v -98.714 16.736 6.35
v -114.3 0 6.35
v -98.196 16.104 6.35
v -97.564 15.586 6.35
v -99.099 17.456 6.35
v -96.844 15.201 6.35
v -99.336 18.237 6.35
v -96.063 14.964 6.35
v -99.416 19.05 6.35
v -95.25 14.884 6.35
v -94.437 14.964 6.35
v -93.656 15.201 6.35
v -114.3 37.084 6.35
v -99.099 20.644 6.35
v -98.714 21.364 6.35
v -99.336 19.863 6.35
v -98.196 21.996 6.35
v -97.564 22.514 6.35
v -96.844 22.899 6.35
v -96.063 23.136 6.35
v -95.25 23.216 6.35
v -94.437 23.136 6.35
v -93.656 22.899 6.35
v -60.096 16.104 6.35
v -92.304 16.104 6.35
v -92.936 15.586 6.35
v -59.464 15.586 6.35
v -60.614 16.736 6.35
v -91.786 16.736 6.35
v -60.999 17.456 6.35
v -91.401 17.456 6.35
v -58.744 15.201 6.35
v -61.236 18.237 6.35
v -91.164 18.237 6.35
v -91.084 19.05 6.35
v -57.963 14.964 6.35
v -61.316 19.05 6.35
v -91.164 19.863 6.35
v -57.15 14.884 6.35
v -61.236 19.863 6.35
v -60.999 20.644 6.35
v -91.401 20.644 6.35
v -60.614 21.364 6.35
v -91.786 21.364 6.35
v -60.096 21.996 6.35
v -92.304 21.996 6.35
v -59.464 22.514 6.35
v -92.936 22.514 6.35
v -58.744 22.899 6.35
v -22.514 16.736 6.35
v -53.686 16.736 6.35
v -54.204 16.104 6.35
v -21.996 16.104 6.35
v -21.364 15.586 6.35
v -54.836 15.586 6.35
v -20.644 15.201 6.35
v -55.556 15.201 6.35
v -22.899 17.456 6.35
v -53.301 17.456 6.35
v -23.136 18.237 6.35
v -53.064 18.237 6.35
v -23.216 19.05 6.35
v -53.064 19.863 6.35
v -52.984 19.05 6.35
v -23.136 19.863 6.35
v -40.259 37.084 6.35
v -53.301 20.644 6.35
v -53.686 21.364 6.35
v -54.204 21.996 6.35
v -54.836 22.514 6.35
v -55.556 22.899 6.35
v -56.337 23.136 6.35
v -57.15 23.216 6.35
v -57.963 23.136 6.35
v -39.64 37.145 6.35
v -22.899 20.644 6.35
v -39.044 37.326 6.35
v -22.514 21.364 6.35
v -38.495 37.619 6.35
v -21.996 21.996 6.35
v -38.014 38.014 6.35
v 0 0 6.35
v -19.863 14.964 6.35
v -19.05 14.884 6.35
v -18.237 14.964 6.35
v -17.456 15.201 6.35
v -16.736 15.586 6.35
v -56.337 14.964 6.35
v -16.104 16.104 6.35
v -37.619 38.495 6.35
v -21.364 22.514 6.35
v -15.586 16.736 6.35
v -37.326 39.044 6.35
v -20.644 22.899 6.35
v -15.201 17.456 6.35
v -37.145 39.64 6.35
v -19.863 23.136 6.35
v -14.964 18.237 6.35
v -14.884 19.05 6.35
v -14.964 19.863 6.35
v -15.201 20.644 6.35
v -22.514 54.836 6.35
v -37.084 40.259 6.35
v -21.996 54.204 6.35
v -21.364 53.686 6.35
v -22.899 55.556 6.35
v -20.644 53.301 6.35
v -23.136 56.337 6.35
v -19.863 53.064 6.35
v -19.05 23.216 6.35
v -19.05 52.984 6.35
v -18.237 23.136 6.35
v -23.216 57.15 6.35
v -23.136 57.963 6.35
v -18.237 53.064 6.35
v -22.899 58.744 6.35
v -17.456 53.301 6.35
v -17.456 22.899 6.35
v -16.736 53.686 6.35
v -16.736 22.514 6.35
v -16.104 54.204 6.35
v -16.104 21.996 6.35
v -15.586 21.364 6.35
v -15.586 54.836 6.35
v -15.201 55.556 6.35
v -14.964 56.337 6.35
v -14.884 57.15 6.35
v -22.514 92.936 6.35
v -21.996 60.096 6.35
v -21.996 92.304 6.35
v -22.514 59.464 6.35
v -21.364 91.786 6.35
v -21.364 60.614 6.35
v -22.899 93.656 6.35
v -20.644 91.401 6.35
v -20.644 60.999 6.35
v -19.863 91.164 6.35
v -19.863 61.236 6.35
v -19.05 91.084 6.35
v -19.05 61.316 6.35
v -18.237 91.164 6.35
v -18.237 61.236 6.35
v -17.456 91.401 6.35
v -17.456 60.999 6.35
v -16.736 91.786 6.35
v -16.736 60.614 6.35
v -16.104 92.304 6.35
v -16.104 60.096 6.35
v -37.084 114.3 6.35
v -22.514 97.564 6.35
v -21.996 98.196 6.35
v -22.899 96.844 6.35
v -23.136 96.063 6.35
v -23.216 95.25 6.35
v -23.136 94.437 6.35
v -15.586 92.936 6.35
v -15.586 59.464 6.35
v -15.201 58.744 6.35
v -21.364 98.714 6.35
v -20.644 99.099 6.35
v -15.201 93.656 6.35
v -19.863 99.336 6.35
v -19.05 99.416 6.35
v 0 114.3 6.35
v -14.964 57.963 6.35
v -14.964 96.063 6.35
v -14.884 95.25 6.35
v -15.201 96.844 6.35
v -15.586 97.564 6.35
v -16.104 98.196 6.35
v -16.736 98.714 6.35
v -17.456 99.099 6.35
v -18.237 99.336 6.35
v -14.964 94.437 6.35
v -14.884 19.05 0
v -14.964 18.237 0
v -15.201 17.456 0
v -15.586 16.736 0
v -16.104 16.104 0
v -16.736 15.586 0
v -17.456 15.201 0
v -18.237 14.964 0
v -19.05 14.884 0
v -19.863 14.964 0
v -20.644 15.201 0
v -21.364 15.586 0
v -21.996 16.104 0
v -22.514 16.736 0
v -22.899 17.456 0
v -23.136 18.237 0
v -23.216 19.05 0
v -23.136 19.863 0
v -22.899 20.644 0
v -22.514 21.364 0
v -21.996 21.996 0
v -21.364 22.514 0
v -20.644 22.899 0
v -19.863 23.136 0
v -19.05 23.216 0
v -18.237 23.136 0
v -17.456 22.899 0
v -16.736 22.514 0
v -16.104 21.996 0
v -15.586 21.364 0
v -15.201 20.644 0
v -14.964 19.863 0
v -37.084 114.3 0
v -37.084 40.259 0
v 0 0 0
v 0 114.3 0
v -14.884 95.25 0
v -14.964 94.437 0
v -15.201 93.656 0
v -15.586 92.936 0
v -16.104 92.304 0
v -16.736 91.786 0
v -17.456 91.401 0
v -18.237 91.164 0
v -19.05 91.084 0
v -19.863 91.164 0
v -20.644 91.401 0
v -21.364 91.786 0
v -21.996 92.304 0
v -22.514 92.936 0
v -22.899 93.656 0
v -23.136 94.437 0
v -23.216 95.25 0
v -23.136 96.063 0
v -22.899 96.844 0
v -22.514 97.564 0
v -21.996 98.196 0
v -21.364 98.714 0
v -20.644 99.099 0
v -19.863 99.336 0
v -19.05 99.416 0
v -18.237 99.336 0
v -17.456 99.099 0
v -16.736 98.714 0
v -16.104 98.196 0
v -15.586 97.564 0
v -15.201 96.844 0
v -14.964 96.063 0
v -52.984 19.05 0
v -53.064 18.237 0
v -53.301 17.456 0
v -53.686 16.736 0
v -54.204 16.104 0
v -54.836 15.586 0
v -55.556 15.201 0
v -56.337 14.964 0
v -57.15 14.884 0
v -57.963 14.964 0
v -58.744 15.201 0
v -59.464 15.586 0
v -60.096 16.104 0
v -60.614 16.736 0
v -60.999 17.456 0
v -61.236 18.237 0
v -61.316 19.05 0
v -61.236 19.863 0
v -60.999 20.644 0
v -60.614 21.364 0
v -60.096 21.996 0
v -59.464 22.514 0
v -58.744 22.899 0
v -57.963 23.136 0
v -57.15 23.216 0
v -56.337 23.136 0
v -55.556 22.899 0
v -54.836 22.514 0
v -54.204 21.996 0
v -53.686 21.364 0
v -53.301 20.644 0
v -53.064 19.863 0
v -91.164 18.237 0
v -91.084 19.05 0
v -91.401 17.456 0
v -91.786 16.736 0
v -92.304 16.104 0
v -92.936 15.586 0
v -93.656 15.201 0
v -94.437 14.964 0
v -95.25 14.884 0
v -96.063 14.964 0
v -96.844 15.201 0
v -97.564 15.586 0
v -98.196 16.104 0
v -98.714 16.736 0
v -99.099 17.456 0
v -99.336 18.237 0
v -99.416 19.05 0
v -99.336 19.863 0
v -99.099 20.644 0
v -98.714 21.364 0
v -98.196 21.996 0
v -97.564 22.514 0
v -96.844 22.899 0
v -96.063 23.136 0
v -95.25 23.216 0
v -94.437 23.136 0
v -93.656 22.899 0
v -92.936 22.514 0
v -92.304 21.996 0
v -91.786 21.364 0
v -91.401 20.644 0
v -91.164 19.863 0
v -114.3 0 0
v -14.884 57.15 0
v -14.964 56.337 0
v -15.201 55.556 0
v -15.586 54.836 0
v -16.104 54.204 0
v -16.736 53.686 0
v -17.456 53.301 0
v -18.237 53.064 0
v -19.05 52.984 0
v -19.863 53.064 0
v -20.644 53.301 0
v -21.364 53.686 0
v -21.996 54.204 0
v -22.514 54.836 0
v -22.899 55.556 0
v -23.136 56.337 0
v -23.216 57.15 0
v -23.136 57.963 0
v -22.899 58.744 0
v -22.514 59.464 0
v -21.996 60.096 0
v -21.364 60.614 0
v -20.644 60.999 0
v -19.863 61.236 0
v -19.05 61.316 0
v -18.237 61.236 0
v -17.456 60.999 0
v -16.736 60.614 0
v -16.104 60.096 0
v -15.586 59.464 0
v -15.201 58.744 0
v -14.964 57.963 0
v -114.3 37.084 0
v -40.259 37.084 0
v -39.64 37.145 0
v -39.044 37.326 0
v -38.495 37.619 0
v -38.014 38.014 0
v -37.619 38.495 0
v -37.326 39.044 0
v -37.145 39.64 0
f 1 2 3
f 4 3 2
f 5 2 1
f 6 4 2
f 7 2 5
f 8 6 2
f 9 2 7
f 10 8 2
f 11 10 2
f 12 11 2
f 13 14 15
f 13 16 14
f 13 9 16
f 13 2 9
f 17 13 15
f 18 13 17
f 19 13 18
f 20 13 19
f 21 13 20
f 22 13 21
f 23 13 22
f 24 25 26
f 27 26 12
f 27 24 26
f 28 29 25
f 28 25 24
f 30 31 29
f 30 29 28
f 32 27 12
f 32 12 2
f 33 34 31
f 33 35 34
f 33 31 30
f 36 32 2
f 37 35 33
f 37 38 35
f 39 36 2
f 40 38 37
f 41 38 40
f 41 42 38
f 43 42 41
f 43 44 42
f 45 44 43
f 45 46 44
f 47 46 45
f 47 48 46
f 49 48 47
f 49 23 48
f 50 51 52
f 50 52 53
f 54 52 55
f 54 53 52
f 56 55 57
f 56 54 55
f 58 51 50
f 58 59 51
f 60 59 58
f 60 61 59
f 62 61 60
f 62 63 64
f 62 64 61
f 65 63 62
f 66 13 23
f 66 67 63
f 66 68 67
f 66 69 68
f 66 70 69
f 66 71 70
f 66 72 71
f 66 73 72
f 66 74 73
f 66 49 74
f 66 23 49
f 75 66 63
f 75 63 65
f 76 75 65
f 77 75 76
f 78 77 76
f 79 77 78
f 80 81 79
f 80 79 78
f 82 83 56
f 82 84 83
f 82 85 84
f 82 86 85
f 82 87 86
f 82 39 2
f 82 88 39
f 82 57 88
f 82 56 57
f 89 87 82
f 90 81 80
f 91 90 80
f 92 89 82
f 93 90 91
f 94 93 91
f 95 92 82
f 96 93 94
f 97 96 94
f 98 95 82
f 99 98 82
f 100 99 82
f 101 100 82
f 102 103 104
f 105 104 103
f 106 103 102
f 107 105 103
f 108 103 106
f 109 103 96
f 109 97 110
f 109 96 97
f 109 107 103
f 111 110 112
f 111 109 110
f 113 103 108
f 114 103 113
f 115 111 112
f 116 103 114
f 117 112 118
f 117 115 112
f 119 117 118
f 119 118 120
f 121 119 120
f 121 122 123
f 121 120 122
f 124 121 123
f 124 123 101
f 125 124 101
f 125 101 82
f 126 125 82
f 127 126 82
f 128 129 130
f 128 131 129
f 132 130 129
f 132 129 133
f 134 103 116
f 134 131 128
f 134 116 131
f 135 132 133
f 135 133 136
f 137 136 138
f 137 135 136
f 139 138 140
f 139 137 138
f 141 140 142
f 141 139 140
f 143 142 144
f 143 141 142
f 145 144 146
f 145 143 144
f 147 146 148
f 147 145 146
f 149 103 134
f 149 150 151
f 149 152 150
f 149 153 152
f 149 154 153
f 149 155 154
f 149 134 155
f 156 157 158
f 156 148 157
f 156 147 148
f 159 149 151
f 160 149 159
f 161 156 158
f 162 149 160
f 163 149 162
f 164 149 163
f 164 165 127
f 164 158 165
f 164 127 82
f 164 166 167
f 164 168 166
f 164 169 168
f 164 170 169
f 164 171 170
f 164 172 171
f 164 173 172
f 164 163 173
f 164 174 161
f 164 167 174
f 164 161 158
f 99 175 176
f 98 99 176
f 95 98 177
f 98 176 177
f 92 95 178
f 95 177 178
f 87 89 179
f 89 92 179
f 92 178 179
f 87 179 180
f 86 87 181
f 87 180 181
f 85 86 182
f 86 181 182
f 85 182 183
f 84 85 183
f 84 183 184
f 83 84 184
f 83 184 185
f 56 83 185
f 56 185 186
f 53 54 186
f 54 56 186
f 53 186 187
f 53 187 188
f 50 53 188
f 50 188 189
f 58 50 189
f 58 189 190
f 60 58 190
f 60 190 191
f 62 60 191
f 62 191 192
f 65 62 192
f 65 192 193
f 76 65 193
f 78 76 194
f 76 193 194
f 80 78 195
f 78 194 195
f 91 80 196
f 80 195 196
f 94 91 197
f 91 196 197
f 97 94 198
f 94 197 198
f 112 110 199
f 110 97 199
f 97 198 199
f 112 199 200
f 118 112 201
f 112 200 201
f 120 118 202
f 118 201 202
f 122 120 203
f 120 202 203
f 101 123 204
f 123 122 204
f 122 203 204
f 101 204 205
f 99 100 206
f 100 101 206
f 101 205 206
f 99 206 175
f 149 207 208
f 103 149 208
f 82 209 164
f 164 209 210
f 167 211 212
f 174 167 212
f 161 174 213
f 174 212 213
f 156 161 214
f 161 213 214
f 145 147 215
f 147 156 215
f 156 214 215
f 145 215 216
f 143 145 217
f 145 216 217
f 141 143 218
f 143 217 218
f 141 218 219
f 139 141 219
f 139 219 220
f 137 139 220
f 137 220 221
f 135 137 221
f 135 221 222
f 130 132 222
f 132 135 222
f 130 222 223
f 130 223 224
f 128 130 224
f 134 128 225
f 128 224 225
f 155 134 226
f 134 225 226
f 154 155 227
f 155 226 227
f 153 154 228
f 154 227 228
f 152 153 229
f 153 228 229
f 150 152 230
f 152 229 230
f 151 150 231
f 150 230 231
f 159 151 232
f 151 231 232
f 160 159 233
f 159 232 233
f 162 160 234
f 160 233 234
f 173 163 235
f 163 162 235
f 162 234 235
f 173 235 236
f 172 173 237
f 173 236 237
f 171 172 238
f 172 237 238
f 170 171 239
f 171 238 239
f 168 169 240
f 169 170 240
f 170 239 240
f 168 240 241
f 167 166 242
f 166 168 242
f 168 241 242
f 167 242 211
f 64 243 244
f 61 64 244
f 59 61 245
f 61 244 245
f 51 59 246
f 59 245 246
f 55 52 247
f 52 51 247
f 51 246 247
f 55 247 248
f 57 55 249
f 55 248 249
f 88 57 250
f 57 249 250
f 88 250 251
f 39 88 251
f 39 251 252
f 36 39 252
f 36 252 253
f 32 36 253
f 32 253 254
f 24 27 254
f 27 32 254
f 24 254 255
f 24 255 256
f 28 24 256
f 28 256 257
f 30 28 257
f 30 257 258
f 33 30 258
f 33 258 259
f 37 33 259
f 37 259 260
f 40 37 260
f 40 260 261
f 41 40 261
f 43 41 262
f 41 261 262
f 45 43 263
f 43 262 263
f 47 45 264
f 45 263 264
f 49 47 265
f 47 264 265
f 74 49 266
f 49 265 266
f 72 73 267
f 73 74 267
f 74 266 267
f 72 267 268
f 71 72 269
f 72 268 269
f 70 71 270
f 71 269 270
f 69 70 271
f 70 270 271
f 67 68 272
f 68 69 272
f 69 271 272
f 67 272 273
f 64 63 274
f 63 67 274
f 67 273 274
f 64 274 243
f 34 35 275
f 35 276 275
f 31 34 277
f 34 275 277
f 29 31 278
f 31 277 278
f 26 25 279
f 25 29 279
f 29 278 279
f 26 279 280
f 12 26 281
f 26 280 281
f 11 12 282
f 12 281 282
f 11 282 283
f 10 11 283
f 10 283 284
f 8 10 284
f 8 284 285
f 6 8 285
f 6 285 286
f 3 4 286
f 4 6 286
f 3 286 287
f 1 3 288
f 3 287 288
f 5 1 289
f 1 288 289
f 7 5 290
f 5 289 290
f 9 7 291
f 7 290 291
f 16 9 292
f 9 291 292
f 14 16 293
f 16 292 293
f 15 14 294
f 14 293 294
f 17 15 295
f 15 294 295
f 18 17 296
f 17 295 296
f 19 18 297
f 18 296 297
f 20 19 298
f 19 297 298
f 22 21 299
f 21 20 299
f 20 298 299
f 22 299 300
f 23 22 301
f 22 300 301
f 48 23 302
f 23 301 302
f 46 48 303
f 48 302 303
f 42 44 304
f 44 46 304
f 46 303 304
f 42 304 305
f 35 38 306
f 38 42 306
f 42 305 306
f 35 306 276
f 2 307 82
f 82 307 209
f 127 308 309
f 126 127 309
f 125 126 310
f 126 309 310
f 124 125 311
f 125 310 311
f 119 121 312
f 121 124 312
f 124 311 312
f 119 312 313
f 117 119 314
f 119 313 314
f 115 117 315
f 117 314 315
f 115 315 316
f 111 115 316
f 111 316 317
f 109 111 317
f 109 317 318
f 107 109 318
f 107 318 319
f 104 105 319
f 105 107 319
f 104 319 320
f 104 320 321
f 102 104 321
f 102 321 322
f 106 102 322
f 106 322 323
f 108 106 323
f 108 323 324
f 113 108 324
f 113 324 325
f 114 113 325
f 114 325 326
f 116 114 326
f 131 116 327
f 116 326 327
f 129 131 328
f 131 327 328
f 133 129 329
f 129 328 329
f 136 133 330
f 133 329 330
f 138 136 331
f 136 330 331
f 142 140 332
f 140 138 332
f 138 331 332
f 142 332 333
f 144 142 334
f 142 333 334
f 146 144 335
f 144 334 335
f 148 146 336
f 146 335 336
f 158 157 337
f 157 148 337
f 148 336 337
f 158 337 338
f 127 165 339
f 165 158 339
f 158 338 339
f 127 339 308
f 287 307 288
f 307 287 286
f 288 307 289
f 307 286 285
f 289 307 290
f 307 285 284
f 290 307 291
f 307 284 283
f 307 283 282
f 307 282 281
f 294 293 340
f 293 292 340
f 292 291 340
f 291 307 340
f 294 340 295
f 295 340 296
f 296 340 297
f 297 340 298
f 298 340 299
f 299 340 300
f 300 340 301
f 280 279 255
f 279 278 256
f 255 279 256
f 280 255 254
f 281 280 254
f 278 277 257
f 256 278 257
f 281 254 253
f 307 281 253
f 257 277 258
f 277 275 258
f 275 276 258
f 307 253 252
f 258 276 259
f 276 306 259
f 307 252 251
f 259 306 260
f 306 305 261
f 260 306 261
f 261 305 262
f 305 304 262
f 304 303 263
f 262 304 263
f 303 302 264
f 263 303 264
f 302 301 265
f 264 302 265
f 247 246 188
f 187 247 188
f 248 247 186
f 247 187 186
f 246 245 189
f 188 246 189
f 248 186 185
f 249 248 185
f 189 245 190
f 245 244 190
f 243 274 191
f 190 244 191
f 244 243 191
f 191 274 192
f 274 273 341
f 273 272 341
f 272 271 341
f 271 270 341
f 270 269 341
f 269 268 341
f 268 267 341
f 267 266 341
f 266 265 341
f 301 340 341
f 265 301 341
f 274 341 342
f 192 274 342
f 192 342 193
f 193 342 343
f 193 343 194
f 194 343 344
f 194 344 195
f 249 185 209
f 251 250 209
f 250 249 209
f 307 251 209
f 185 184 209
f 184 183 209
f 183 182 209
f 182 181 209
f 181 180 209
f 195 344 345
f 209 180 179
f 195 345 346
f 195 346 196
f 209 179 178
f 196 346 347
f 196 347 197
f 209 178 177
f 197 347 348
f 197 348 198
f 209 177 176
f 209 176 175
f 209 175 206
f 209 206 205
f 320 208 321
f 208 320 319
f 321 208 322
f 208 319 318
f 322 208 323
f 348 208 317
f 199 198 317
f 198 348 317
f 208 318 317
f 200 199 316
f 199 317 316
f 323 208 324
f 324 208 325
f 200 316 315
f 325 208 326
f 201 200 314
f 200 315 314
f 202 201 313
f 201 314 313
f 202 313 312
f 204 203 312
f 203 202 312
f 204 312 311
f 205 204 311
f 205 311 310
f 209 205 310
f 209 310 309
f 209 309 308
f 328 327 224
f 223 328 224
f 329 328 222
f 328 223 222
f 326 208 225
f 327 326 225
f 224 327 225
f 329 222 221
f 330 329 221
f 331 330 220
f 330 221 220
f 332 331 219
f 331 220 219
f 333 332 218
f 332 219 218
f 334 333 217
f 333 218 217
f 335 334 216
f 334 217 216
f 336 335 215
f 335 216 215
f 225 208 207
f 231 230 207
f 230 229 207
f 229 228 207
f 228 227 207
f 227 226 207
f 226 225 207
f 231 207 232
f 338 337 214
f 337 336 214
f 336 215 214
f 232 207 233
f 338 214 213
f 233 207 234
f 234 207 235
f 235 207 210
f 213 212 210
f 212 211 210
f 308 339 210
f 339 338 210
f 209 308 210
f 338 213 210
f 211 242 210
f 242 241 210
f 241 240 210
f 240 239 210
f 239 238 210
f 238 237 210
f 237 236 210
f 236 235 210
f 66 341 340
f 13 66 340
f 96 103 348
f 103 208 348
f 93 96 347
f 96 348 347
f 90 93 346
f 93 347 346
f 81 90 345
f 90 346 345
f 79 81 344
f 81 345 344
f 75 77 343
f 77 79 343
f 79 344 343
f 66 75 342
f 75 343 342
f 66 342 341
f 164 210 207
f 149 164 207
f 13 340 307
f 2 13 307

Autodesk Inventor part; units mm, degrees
ref_plane "YZ Plane" through (0, 0, 0) normal (1, 0, 0) x (0, 1, 0)
ref_plane "XZ Plane" through (0, 0, 0) normal (0, 1, 0) x (-1, 0, 0)
ref_plane "XY Plane" through (0, 0, 0) normal (0, 0, 1) x (1, 0, 0)
sketch "Sketch_1" plane through (0, 0, 0) normal (0, 0, 1) x (1, 0, 0)
  line L0 (-114.3, 37.084) -> (-114.3, 0)
  line L1 (-114.3, 0) -> (0, 0)
  line L2 (0, 0) -> (0, 114.3)
  line L3 (0, 114.3) -> (-37.084, 114.3)
  line L4 (-37.084, 114.3) -> (-37.084, 40.259)
  arc A0 (-40.259, 37.084) -> (-37.084, 40.259) centre (-40.259, 40.259) ccw
  line L5 (-40.259, 37.084) -> (-114.3, 37.084)
  circle A1 centre (-19.05, 19.05) radius 4.1656
  circle A2 centre (-19.05, 95.25) radius 4.1656
  circle A3 centre (-19.05, 57.15) radius 4.1656
  circle A4 centre (-57.15, 19.05) radius 4.1656
  circle A5 centre (-95.25, 19.05) radius 4.1656
extrude "Extrusion1" add sketch "Sketch_1" along normal blind 6.35
properties part number "4481"
